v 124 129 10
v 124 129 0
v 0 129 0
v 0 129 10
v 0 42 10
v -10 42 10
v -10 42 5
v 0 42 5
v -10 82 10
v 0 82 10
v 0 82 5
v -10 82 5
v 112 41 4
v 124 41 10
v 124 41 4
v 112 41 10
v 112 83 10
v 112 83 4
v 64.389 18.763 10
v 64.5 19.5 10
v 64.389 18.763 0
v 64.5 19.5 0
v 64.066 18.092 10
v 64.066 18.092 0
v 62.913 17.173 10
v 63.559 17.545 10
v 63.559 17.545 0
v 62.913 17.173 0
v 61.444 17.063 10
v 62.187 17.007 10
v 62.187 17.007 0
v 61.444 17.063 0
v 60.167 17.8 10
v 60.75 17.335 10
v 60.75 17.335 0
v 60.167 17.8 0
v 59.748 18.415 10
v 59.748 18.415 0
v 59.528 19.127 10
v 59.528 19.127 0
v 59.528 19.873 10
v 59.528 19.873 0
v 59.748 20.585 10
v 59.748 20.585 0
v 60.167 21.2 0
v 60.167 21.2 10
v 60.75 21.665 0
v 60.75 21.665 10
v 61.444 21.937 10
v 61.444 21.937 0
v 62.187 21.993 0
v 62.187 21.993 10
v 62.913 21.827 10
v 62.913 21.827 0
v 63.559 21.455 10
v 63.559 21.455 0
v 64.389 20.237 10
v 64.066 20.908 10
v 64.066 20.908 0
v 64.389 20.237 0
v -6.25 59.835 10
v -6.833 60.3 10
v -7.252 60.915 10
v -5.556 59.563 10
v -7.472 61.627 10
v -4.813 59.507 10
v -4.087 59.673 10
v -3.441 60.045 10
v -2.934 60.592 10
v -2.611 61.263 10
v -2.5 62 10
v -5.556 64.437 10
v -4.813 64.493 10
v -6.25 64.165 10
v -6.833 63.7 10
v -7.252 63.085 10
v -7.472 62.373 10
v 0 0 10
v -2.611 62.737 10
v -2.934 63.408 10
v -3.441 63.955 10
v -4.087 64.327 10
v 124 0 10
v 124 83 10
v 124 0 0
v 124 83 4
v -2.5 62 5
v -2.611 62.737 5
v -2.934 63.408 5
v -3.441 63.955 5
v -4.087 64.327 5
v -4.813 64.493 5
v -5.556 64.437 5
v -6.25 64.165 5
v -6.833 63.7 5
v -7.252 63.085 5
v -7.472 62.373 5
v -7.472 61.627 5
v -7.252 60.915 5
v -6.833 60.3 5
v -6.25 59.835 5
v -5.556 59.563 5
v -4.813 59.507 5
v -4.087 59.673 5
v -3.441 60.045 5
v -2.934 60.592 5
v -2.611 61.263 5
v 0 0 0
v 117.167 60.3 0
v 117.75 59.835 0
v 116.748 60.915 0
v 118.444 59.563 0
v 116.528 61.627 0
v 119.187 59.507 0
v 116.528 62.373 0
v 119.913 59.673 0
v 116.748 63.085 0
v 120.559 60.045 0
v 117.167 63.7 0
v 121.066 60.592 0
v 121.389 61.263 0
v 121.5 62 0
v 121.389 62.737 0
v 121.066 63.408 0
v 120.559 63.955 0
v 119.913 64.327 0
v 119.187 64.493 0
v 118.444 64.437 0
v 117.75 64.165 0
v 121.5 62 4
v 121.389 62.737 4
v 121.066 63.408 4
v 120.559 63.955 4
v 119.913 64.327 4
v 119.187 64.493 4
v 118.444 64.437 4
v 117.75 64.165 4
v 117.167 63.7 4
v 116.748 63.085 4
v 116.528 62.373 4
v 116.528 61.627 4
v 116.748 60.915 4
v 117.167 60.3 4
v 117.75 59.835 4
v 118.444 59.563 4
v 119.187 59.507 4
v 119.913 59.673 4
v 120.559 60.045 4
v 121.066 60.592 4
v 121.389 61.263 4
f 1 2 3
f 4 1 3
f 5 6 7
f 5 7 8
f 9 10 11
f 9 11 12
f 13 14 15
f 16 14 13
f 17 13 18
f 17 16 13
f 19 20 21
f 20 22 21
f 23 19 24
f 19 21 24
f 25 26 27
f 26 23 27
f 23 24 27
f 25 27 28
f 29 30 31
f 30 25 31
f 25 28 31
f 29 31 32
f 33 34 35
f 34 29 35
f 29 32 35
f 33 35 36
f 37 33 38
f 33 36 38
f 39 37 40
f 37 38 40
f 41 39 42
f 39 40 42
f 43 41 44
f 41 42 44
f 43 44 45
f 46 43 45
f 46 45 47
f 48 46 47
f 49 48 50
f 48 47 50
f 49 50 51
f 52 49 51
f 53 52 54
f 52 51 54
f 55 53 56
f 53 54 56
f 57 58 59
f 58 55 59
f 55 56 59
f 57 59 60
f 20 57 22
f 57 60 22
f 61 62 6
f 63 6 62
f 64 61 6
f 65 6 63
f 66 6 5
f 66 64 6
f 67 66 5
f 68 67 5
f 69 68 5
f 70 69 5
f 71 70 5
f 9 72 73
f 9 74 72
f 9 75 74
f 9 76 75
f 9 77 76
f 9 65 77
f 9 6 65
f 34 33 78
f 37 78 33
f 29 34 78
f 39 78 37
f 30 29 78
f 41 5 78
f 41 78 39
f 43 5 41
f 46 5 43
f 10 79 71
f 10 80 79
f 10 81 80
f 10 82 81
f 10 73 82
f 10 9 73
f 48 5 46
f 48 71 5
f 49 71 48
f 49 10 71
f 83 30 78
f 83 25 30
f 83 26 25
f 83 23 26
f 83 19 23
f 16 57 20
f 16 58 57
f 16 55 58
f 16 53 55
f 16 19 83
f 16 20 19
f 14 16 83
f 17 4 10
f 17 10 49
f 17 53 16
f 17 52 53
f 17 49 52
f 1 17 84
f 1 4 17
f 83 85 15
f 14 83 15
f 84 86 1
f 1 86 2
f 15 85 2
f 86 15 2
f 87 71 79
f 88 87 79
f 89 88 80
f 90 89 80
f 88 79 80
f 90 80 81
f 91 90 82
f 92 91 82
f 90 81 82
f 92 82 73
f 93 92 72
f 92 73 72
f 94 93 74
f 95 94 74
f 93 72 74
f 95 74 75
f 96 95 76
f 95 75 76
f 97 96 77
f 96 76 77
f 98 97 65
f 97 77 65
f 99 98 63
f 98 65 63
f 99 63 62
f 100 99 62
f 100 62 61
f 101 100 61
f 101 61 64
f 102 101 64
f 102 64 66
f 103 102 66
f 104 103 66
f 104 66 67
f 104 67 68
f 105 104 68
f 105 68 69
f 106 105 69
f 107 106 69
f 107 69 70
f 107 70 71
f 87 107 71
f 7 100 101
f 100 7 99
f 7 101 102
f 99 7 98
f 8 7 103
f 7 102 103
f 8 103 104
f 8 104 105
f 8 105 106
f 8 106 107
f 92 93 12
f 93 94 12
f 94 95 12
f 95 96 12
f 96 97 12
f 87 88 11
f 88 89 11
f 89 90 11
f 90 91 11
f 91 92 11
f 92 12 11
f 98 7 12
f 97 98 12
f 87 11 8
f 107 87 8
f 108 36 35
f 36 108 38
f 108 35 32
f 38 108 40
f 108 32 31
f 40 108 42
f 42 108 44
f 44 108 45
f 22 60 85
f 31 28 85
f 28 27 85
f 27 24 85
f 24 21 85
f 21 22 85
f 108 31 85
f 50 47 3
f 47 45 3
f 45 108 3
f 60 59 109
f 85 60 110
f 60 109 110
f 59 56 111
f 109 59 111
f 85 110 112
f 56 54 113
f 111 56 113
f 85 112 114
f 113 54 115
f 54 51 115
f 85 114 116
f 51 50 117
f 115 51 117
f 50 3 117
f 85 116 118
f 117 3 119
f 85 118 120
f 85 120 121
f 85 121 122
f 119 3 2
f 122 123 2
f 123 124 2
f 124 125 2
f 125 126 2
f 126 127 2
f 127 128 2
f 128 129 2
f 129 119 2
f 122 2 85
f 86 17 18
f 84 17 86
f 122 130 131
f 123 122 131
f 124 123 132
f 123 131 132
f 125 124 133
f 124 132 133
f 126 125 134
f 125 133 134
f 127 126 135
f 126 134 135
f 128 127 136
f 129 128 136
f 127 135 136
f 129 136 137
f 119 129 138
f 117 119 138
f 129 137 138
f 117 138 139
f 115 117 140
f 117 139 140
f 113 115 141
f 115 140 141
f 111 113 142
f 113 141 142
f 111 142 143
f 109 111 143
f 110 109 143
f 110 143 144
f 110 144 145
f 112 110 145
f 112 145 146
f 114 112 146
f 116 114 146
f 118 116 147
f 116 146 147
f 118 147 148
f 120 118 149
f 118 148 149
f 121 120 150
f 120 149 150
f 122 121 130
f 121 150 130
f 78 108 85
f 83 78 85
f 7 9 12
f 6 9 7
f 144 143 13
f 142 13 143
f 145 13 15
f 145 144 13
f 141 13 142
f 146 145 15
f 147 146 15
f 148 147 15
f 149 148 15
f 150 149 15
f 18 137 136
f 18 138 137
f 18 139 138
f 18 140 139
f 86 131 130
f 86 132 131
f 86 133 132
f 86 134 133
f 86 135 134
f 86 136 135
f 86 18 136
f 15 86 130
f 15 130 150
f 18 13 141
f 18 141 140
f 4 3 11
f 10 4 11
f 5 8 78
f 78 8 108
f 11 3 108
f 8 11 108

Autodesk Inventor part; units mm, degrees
ref_plane "YZ Plane" through (0, 0, 0) normal (1, 0, 0) x (0, 1, 0)
ref_plane "XZ Plane" through (0, 0, 0) normal (0, 1, 0) x (-1, 0, 0)
ref_plane "XY Plane" through (0, 0, 0) normal (0, 0, 1) x (1, 0, 0)
sketch "Sketch1" plane through (0, 0, 0) normal (0, 0, 1) x (1, 0, 0)
  line L0 (0, 0) -> (124, 0)
  line L1 (124, 0) -> (124, 129)
  line L2 (124, 129) -> (0, 129)
  line L3 (0, 129) -> (0, 0)
  circle A0 centre (62, 19.5) radius 2.5
  point P0 (62, 0)
  dimension "d0" = 124
  dimension "d1" = 129
  dimension "d2" = 5
  dimension "d3" = 19.5
extrude "Extrusion1" add sketch "Sketch1" along normal blind 10
sketch "Sketch2" plane through (0, 0, 10) normal (0, 0, 1) x (1, 0, 0)
  line L0 (0, 82) -> (-10, 82)
  line L1 (-10, 82) -> (-10, 42)
  line L2 (-10, 42) -> (0, 42)
  line L3 (0, 42) -> (0, 82)
  circle A0 centre (-5, 62) radius 2.5
  line L4 (0, 124) -> (0, 0)
  line L5 (0, 129) -> (0, 0) projected
  point P0 (-10, 62)
  point P1 (0, 62)
  point P2 (-5, 82)
  point P3 (0, 62)
  dimension "d8" = 10
  dimension "d9" = 40
  dimension "d10" = 5
  dimension "d27" = 124
extrude "Extrusion2" add sketch "Sketch2" against normal blind 5
sketch "Sketch3" plane through (0, 0, 10) normal (0, 0, 1) x (1, 0, 0)
  line L0 (124, 41) -> (112, 41)
  line L1 (112, 41) -> (112, 83)
  line L2 (112, 83) -> (124, 83)
  line L3 (124, 83) -> (124, 41)
  line L4 (124, 0) -> (124, 129) projected
  line L5 (124, 124) -> (124, 0)
  point P0 (0, 0)
  point P1 (112, 62)
  point P2 (124, 62)
  point P3 (124, 62)
  dimension "d13" = 12
  dimension "d14" = 42
  dimension "d28" = 124
extrude "Extrusion3" cut sketch "Sketch3" against normal blind 6
sketch "Sketch4" plane through (0, 0, 4) normal (0, 0, 1) x (1, 0, 0)
  line L0 (124, 41) -> (112, 41) construction
  line L1 (124, 83) -> (124, 41) construction
  line L2 (112, 83) -> (124, 83) construction
  line L3 (112, 41) -> (112, 83) construction
  circle A0 centre (119, 62) radius 2.5
  point P0 (0, 0)
  point P1 (124, 62)
  point P2 (118, 41)
  dimension "d17" = 5
  dimension "d29" = 5
extrude "Extrusion4" cut sketch "Sketch4" against normal through all
properties part number "TA002" material "ABS Plastic"
